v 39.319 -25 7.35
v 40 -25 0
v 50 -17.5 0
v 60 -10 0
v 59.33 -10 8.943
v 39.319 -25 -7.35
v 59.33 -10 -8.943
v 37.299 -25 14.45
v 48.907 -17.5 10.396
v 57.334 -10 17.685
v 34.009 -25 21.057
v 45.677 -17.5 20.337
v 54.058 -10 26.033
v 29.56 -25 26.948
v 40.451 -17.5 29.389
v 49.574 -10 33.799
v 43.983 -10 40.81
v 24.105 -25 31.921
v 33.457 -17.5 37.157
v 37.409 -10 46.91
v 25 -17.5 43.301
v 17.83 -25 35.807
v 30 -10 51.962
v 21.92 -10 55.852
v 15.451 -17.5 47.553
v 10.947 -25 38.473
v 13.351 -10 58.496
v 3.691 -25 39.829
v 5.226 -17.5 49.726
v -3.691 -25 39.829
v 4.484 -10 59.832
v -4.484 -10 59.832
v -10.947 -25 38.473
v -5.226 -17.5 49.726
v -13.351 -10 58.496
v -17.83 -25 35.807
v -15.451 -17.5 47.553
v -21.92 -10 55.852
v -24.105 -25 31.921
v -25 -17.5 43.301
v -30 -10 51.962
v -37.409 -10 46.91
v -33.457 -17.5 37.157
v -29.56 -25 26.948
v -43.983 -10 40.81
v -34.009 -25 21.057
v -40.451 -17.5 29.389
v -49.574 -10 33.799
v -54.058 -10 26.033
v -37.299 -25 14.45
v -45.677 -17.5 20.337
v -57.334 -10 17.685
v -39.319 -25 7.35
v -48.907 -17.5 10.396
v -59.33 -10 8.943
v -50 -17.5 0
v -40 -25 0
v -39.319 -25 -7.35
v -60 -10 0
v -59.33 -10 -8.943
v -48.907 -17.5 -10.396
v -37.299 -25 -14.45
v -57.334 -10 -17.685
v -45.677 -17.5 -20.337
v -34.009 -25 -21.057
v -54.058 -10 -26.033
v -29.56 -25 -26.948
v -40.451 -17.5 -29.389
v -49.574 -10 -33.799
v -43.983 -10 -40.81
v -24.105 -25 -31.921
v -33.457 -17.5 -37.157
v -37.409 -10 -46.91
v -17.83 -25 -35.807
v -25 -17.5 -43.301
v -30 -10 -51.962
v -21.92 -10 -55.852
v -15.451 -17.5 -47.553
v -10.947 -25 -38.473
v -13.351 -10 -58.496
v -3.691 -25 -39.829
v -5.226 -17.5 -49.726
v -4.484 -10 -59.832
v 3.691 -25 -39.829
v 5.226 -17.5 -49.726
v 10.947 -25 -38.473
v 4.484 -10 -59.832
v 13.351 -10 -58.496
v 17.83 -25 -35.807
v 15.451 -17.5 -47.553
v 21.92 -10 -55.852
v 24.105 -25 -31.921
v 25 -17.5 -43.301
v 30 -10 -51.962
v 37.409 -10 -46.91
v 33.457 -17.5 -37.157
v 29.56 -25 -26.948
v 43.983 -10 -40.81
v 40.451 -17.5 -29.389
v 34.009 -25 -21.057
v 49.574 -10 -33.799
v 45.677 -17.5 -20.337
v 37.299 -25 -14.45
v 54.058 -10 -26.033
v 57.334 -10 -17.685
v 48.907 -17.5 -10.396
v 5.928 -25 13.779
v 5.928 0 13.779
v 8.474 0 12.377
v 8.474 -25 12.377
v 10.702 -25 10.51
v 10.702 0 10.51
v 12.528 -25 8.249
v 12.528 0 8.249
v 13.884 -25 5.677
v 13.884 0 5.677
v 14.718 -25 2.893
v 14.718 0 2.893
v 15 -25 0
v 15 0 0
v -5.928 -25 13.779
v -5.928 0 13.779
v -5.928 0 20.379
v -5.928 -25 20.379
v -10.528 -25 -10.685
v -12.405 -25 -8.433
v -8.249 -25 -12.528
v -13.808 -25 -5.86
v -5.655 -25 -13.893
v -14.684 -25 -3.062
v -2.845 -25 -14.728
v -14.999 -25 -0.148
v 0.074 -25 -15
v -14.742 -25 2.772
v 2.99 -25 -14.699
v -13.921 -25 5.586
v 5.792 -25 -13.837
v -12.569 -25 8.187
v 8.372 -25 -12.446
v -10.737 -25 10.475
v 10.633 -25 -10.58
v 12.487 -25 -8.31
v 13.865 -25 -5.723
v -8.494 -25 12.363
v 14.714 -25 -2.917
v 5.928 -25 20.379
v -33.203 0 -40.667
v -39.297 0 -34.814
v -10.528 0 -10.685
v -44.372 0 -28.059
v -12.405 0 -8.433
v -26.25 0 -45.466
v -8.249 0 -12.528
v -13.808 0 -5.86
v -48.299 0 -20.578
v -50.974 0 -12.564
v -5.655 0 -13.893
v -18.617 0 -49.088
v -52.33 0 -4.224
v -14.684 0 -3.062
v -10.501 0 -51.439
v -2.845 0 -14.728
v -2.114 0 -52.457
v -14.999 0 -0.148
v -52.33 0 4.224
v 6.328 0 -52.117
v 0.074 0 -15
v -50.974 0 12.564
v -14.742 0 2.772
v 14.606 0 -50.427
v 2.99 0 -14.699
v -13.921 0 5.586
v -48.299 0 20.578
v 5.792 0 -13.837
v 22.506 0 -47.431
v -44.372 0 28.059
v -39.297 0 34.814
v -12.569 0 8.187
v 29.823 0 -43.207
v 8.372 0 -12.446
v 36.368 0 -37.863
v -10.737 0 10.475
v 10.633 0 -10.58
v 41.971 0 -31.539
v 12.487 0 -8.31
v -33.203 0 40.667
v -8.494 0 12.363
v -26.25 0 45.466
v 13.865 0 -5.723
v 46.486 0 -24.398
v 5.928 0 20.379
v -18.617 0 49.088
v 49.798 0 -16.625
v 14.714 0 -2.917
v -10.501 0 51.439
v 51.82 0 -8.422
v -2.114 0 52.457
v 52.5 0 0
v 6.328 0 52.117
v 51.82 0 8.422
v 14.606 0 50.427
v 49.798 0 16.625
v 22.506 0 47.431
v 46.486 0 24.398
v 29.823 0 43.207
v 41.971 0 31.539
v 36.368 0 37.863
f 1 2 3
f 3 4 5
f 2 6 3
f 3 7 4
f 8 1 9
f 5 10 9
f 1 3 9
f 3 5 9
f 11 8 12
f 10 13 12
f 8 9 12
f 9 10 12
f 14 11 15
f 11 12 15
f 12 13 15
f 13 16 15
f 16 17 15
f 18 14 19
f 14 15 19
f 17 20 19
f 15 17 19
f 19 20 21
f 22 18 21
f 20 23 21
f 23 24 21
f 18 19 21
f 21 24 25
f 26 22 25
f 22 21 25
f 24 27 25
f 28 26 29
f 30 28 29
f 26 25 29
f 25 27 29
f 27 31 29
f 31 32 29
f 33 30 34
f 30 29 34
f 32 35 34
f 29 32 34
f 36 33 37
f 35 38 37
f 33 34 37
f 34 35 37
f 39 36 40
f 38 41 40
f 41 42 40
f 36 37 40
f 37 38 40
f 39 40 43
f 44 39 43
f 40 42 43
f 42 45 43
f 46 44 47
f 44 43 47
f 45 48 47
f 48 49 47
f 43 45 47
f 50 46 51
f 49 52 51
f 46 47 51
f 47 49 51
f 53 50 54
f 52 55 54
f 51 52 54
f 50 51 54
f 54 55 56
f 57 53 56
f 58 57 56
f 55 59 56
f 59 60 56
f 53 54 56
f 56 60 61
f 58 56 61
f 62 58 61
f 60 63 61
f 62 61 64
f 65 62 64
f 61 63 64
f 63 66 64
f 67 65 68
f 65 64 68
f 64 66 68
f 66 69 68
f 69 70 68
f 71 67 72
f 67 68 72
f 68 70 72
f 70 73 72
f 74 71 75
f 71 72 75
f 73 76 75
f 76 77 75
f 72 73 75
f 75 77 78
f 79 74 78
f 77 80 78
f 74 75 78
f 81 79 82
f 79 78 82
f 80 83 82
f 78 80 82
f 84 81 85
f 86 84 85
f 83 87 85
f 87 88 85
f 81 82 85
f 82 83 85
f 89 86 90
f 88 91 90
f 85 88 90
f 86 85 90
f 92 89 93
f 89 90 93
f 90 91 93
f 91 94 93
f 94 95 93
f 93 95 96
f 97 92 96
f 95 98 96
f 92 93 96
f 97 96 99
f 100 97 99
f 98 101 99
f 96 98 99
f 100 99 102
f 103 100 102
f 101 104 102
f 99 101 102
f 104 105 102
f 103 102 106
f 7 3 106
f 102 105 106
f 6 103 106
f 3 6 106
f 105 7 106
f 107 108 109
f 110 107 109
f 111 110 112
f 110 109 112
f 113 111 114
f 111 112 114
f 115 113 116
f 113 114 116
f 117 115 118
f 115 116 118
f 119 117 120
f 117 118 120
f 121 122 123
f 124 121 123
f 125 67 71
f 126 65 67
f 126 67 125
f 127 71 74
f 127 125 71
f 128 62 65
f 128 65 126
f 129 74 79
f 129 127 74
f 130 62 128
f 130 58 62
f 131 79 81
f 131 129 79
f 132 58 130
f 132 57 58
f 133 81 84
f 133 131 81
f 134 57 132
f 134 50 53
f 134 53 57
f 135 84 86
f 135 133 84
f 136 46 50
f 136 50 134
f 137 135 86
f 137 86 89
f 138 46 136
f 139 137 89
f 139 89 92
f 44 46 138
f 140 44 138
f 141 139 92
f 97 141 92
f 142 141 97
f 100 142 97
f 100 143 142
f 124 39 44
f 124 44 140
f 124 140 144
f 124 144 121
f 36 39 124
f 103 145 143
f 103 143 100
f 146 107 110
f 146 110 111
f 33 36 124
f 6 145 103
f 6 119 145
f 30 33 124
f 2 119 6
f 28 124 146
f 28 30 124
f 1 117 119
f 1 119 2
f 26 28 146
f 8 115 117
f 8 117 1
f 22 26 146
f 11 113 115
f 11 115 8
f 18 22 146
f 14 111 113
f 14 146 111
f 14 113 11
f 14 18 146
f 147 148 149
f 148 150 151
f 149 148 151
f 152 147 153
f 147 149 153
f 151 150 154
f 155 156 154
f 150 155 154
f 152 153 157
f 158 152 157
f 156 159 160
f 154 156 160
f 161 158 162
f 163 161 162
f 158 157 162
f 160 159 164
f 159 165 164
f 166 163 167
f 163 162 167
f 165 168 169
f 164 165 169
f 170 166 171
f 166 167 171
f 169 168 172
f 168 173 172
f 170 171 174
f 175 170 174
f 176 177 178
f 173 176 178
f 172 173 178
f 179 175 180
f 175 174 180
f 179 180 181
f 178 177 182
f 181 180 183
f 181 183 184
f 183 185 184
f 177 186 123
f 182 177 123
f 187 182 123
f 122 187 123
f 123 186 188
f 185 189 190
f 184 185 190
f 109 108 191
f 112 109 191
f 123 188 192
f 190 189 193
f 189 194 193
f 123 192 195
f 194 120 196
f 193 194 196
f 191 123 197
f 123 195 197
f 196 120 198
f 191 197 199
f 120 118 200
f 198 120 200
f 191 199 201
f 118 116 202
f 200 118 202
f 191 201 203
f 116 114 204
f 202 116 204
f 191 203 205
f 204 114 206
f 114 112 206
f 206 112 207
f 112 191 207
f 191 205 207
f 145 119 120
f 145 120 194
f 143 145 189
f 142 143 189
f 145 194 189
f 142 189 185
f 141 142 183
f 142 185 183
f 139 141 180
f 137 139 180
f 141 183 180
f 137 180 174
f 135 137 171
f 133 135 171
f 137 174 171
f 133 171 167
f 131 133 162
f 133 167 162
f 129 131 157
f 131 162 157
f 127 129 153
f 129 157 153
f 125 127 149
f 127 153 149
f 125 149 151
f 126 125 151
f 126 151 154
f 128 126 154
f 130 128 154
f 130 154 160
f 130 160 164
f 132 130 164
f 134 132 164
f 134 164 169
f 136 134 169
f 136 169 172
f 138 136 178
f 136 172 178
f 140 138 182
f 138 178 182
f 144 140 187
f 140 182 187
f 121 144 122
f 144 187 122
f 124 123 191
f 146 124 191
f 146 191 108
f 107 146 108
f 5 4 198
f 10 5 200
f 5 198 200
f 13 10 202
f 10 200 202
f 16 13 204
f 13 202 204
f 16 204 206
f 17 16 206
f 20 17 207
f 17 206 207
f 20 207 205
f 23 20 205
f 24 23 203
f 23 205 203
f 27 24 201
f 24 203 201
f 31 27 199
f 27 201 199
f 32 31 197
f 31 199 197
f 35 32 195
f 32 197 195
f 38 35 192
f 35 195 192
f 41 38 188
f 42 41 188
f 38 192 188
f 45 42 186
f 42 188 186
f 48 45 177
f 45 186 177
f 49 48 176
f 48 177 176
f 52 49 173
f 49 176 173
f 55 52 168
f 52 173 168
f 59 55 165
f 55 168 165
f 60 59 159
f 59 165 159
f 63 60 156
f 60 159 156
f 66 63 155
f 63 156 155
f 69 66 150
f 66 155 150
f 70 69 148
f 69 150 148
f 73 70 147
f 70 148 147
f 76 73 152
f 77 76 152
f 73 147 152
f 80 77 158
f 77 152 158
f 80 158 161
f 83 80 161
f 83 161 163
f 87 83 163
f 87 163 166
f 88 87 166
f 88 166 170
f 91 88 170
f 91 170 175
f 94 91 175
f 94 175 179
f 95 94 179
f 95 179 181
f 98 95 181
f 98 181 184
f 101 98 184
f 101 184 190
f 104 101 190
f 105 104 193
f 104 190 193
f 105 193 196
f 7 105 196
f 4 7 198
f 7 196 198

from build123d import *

# Parameters (mm, degrees)
F0_R     = 60
F1_DEPTH = 25
F2_SIZE2 = 7.5
F2_SIZE  = 10
F3_SIZE2 = 14.99999
F3_SIZE  = 19.99999


# Not quite as in the source:
# - a fillet or chamfer is up to 0.001 mm smaller than in the source, because OpenCascade refuses the exact size


with BuildPart() as f1:
    # F0 (on Front) → F1 (new body)
    with BuildSketch(Plane.XZ):
        Circle(F0_R)
        with BuildLine():
            ThreePointArc((5.9278272092, 13.7790008556), (12.5283160907, 8.2487148048), (15, 0))
            ThreePointArc((15, 0), (-8.2487148048, -12.5283160907), (-5.9278272092, 13.7790008556))
            Line((-5.9278272092, 13.7790008556), (-5.9278272092, 20.3793700784))
            Line((-5.9278272092, 20.3793700784), (5.9278272092, 20.3793700784))
            Line((5.9278272092, 20.3793700784), (5.9278272092, 13.7790008556))
        make_face(mode=Mode.SUBTRACT)
    extrude(amount=F1_DEPTH)

    # F2
    f2_edges = [f1.edges().sort_by_distance(p)[0] for p in [
        (-60, 0, 0),
    ]]
    f2_side = f1.faces().sort_by_distance((-60, -12.5, 0))[0]
    chamfer(f2_edges, length=F2_SIZE, length2=F2_SIZE2, reference=f2_side)

    # F3 (size 20 and 15 in the source; OpenCascade refuses exactly that, so slightly less here)
    f3_edges = [f1.edges().sort_by_distance(p)[0] for p in [
        (-60, -25, 0),
    ]]
    f3_side = f1.faces().sort_by_distance((-58.302944, -25, 0))[0]
    chamfer(f3_edges, length=F3_SIZE, length2=F3_SIZE2, reference=f3_side)


solid = f1.part
